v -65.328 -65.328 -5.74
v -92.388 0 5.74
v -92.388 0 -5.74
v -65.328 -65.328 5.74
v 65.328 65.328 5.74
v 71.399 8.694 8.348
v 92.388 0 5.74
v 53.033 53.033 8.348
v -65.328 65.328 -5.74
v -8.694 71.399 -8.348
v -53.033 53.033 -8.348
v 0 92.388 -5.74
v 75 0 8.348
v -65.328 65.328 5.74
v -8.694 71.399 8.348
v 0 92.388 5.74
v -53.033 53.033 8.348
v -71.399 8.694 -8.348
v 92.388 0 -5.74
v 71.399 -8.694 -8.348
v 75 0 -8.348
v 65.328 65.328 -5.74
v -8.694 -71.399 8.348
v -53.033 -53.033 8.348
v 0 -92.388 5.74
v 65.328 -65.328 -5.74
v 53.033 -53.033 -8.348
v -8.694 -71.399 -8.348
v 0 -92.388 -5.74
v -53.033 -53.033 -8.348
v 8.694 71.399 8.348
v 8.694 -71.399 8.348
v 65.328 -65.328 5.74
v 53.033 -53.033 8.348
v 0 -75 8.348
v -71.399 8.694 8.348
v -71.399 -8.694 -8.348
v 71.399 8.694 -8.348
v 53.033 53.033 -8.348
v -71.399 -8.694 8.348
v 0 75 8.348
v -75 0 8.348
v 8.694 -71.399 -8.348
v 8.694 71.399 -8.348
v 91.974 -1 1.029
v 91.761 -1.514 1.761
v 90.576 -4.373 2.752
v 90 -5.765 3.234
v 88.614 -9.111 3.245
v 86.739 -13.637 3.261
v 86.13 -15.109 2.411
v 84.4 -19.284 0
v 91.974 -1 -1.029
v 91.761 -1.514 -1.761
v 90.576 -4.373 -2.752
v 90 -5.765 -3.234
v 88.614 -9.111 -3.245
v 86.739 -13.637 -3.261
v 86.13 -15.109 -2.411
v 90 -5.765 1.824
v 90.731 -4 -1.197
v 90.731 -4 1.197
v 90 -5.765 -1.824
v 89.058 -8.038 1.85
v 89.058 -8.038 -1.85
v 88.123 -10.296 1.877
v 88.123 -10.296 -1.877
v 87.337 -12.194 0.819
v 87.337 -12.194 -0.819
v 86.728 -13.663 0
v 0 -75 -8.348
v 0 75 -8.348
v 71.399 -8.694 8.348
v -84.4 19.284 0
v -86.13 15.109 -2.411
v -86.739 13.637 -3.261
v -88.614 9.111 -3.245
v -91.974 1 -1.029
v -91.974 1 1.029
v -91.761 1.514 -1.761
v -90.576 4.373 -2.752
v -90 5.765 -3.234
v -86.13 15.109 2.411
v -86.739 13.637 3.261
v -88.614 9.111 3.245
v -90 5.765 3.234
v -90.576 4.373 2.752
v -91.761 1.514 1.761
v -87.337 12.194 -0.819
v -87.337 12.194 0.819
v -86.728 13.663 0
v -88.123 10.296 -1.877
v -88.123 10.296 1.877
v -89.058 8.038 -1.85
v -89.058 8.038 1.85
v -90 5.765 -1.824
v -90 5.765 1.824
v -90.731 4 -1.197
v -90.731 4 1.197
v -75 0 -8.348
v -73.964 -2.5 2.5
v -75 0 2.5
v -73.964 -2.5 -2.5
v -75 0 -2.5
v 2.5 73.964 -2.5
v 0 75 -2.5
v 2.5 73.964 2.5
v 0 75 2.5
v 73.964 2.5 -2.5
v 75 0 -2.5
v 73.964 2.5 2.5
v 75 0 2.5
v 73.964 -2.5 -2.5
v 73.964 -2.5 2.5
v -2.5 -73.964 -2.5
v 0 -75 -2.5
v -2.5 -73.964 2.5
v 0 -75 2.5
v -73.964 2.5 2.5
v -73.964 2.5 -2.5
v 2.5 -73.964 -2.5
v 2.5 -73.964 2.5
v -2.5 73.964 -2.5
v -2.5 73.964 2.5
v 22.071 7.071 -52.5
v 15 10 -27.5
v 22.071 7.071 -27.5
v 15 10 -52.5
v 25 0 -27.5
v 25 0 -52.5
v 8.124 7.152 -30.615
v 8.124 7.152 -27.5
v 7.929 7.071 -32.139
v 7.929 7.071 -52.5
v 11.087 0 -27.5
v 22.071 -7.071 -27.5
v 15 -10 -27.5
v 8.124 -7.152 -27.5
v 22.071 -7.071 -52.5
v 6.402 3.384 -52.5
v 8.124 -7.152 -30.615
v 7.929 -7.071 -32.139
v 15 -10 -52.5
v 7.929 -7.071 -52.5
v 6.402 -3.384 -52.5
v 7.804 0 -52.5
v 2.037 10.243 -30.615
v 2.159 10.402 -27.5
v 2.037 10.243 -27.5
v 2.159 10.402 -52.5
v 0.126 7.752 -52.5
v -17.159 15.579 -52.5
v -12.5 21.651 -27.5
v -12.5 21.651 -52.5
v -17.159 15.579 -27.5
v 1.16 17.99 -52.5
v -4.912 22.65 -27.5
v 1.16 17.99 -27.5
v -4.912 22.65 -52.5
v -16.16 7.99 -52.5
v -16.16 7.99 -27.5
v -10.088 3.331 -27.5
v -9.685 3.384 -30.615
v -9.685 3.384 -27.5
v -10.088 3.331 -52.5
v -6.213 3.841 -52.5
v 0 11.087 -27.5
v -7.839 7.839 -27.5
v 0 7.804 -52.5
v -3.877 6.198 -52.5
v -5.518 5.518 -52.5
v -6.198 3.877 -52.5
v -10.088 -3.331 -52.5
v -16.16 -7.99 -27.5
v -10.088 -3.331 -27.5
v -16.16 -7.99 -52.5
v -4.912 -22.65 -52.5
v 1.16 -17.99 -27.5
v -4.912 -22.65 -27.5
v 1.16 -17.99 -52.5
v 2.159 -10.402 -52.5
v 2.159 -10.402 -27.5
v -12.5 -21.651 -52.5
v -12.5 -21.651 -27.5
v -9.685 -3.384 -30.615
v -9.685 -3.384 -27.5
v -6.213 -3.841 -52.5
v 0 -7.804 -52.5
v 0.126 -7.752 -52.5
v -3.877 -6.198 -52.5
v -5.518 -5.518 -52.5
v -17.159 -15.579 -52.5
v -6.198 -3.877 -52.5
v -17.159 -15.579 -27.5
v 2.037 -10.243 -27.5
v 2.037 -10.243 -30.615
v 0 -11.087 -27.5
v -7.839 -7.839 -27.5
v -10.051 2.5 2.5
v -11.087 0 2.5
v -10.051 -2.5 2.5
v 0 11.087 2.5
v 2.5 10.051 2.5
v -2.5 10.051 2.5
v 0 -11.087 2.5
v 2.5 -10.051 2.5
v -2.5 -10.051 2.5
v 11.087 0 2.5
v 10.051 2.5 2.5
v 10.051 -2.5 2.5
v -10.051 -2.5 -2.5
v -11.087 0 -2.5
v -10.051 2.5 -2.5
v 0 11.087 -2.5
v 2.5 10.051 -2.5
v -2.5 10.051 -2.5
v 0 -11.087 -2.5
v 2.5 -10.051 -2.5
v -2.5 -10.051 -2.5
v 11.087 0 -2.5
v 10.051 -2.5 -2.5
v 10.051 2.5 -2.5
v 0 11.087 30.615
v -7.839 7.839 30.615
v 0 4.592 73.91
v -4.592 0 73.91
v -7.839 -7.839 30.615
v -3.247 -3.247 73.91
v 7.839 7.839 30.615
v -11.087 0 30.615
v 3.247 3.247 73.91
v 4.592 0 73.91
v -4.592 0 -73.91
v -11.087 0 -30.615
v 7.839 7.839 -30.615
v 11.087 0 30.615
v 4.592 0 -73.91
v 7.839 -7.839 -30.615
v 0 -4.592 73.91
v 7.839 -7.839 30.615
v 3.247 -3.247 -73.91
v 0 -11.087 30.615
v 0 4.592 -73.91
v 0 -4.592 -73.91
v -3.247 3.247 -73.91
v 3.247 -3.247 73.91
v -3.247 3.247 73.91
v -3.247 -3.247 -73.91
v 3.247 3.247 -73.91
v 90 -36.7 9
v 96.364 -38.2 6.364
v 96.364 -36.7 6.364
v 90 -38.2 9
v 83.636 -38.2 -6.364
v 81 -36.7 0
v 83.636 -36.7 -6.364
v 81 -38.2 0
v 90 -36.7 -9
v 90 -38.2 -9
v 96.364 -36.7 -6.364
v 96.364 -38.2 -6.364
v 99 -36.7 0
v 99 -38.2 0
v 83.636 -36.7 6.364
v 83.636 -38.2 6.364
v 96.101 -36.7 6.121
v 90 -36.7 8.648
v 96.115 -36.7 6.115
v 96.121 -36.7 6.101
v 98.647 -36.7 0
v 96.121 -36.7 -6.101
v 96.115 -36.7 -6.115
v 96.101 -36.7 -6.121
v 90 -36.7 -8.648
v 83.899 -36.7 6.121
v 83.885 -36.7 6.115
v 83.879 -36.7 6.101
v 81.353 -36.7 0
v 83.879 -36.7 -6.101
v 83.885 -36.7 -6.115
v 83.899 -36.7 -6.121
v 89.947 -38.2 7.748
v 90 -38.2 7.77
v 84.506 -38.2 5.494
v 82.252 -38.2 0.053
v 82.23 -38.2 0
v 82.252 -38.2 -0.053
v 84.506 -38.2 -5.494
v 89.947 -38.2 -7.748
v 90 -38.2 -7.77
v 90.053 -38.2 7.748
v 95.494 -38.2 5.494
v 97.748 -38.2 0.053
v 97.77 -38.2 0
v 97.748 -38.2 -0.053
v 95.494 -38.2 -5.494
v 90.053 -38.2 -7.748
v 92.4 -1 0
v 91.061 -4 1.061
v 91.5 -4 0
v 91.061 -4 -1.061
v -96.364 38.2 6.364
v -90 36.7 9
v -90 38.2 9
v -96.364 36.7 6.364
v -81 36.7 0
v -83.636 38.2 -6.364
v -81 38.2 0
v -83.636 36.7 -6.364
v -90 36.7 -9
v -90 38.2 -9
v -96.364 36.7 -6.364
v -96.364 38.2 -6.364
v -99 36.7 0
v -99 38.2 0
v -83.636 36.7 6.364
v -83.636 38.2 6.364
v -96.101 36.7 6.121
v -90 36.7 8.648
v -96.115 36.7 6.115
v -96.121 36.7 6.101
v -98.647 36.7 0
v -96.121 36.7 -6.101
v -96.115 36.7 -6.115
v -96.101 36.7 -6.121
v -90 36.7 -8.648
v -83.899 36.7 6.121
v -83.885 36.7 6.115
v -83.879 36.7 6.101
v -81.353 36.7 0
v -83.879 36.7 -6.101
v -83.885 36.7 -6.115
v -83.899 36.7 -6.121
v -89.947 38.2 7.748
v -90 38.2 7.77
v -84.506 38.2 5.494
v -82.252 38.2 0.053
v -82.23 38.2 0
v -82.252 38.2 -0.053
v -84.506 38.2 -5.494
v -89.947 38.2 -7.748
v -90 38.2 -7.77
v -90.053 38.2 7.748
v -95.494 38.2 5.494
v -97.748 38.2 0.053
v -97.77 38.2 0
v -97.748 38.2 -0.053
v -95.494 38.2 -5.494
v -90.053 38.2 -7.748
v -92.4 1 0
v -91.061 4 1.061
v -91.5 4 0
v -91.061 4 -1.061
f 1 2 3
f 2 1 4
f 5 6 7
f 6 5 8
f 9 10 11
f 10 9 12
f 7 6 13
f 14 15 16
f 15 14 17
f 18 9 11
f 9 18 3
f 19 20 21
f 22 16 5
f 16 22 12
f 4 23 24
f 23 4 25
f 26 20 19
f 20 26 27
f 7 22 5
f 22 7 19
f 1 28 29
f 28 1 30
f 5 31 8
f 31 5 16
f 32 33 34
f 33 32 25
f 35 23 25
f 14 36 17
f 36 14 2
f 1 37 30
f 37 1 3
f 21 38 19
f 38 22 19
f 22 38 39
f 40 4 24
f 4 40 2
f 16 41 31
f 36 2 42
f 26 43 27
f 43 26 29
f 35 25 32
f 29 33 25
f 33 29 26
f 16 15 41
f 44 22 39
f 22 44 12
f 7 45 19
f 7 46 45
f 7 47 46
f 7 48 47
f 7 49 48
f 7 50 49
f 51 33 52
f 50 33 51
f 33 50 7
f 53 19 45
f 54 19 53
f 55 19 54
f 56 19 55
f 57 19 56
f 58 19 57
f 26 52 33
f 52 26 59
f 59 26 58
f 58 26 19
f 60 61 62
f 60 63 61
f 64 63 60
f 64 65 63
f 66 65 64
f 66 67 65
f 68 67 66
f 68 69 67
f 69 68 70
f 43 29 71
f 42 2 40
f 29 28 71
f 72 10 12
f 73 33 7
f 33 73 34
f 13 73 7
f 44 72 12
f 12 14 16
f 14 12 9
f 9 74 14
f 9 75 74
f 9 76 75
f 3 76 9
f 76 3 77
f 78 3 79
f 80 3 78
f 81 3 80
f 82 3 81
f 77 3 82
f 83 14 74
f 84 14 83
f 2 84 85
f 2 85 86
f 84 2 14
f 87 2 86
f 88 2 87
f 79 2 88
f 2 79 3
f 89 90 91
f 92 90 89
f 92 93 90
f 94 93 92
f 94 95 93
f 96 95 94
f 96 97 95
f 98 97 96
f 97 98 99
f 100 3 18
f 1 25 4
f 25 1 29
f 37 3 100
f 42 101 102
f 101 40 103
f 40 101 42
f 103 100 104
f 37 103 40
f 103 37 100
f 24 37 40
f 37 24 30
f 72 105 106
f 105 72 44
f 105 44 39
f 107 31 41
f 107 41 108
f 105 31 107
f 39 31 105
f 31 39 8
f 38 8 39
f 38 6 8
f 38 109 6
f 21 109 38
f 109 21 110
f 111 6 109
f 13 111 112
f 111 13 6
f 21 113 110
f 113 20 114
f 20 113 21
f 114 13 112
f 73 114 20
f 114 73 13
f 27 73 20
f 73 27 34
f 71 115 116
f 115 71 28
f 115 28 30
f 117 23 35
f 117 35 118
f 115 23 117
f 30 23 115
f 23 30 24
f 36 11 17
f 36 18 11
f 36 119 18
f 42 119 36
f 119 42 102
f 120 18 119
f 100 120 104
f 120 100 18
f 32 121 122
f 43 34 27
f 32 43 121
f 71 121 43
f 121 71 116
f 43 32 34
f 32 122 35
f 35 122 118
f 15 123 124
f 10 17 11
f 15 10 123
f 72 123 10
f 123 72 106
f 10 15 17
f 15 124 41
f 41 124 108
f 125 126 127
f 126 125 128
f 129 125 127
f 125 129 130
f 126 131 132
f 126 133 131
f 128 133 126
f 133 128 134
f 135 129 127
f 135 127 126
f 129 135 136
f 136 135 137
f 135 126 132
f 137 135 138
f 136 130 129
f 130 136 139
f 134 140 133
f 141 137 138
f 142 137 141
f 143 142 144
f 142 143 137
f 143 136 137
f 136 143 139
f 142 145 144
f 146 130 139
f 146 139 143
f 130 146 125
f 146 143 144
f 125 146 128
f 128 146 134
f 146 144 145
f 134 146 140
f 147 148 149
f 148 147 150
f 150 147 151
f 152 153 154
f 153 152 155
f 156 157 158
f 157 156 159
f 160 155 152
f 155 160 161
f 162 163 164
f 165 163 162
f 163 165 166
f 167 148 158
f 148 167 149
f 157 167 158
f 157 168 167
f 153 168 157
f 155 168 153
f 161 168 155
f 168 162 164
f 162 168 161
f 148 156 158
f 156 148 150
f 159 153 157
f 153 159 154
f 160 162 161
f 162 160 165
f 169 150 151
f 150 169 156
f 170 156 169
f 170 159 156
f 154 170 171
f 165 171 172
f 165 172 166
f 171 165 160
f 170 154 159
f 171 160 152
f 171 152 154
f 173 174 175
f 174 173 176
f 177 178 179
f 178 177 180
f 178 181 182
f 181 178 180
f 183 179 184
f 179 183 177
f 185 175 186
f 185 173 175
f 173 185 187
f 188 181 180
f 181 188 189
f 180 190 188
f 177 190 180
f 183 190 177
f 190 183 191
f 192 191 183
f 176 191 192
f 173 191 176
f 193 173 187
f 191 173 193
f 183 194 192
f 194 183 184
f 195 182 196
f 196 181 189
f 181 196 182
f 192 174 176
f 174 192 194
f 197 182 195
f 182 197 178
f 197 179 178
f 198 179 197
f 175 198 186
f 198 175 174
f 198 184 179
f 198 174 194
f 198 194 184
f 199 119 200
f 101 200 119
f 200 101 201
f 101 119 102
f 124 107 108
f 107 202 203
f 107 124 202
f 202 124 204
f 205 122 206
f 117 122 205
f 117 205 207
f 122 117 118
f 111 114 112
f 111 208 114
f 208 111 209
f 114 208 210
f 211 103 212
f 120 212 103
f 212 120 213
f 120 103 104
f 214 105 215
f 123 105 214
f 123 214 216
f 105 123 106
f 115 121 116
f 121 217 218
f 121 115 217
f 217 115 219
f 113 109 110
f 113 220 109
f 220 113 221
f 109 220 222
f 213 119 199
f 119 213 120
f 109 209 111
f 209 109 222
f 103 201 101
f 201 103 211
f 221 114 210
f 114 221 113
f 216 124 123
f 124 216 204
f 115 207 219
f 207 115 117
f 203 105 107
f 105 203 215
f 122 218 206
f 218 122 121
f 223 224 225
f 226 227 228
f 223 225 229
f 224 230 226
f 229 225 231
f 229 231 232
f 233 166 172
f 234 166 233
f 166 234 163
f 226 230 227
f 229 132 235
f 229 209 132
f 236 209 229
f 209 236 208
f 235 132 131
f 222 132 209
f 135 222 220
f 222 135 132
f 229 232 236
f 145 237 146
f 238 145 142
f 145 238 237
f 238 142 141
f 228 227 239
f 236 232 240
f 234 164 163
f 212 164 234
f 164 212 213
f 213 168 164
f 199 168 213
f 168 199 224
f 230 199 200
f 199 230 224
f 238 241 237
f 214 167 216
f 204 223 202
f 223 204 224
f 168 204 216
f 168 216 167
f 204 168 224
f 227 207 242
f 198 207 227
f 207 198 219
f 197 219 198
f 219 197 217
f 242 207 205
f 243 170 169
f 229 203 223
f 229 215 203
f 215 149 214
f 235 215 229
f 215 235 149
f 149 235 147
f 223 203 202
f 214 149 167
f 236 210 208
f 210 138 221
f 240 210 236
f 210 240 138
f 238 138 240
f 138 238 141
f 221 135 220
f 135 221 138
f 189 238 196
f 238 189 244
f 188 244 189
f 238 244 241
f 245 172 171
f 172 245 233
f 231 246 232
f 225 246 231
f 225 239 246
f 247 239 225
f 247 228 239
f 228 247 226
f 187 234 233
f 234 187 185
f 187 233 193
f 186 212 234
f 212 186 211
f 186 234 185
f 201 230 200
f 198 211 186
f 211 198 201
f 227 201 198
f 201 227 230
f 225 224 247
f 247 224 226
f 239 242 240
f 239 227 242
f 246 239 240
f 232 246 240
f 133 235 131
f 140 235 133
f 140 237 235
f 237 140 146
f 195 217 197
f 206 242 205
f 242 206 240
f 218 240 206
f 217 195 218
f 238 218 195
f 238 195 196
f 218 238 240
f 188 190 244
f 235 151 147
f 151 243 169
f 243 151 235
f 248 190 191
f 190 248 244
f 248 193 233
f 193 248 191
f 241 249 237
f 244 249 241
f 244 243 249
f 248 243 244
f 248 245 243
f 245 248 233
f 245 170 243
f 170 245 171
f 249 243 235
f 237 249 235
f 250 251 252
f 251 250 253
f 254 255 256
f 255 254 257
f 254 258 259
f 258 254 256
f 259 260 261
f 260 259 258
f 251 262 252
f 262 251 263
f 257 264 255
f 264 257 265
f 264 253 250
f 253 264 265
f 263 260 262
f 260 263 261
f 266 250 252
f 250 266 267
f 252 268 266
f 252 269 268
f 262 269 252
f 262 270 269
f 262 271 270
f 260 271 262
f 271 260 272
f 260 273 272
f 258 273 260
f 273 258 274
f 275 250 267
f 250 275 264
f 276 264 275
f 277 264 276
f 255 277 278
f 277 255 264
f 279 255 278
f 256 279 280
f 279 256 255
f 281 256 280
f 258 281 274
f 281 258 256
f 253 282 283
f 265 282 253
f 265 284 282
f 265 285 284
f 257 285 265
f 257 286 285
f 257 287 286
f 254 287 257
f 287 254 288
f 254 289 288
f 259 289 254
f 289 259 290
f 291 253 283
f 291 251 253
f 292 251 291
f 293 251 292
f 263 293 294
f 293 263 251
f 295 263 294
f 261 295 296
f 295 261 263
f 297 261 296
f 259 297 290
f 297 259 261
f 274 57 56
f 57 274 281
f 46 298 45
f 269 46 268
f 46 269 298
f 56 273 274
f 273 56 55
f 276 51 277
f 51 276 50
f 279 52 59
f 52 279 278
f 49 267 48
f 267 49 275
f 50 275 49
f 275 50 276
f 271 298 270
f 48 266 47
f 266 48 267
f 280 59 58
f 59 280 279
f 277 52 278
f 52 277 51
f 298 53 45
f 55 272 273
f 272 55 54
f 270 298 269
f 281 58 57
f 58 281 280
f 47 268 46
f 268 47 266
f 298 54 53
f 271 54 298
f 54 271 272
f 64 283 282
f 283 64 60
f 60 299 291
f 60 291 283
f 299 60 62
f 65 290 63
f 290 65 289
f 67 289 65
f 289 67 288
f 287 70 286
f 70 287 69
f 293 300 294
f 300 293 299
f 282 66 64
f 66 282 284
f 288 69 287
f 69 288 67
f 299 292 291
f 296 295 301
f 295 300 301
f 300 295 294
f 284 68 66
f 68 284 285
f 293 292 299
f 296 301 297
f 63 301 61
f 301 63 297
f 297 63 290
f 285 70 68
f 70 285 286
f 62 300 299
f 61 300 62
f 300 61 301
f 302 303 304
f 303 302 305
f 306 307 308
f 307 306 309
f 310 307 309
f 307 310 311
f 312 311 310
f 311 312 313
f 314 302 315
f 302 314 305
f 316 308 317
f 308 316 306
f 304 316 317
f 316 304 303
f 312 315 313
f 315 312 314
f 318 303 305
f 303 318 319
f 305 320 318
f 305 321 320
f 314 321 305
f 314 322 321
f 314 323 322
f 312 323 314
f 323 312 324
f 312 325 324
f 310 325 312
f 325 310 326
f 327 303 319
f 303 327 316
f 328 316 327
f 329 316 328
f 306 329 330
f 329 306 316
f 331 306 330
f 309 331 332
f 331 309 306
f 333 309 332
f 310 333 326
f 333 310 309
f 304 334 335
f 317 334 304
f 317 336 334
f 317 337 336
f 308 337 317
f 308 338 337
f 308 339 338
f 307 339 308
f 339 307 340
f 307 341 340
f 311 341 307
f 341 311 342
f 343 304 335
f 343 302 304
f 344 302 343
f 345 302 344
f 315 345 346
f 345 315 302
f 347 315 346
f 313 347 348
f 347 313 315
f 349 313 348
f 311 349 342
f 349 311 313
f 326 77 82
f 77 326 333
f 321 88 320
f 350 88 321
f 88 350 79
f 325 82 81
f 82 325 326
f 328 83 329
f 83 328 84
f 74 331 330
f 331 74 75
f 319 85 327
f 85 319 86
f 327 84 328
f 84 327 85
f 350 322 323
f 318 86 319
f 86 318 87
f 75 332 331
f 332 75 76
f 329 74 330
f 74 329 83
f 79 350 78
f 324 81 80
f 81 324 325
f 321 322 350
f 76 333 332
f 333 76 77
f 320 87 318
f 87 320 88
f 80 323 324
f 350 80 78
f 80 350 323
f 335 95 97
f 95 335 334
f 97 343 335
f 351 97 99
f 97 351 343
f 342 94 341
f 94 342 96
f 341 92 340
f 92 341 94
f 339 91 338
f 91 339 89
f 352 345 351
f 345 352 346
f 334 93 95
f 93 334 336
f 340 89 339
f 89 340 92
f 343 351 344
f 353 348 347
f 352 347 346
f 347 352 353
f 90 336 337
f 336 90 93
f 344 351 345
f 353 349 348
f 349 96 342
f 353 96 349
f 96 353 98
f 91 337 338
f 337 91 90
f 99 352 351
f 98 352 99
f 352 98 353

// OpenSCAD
// file: imposter_docking_port.scad
module docking_port(x, y, z, rx, ry, rz, angle, scale) {
	translate([x,y,z]) {
		scale(v = [scale, scale, scale]) {
			rotate(v = [rx, ry, rz], a = angle) {
				rotate(v = [0, 1, 0], a = 90)
					union() {
						cylinder(h = 10, r1 = 30, r2 = 10);
						translate(v = [0, 0, -4])
							cylinder(h = 5, r1 = 30, r2 = 30);
					}
			}
		}
	}
}

module docking_port2(x, y, z, rx, ry, rz, angle, scale) {
	translate([x,y,z]) {
		scale(v = [scale, scale, scale]) {
			rotate(v = [rx, ry, rz], a = angle) {
				rotate(v = [0, 1, 0], a = 90)
					difference() {
					union() {
						cylinder(h = 10, r1 = 30, r2 = 10);
						translate(v = [0, 0, -4])
							cylinder(h = 5, r1 = 30, r2 = 30);
						cylinder(h = 120, r1 = 29, r2 = 8);
					}
					translate(v = [0, 0, -10])
						cylinder(h = 120, r1 = 27, r2 = 5);
					}
			}
		}
	}
}
// main file
$fn = 8;

scale(v = [5, 5, 5])
union() {
	difference() {
		scale(v = [1, 1, 0.15])
			sphere(r = 20);
		cylinder(h = 10, r1 = 15, r2 = 15, center = true);
	}
	cube(size = [35, 1, 1], center = true);
	rotate(a = 90, v = [0, 0, 1])
		cube(size = [35, 1, 1], center = true);
	scale(v = [0.3, 0.3, 2])
	sphere(r = 8, center = true);
	translate(v = [0, 0, -8]) {
		translate(v = [3, 0, 0])
			cylinder(h = 5, r1 = 2, r2 = 2, center = true);
		rotate(a = 360 / 3.0, v = [0, 0, 1])
			translate(v = [3, 0, 0])
				cylinder(h = 5, r1 = 2, r2 = 2, center = true);
		rotate(a = -360 / 3.0, v = [0, 0, 1])
			translate(v = [3, 0, 0])
				cylinder(h = 5, r1 = 2, r2 = 2, center = true);
	}
}

use <imposter_docking_port.scad>;
docking_ports = true;
if (docking_ports) {
        docking_port2(90, -37, 0, 0, 0, 1, 90, 0.3);
        docking_port2(-90, 37, 0, 0, 0, 1, -90, 0.3);
}
